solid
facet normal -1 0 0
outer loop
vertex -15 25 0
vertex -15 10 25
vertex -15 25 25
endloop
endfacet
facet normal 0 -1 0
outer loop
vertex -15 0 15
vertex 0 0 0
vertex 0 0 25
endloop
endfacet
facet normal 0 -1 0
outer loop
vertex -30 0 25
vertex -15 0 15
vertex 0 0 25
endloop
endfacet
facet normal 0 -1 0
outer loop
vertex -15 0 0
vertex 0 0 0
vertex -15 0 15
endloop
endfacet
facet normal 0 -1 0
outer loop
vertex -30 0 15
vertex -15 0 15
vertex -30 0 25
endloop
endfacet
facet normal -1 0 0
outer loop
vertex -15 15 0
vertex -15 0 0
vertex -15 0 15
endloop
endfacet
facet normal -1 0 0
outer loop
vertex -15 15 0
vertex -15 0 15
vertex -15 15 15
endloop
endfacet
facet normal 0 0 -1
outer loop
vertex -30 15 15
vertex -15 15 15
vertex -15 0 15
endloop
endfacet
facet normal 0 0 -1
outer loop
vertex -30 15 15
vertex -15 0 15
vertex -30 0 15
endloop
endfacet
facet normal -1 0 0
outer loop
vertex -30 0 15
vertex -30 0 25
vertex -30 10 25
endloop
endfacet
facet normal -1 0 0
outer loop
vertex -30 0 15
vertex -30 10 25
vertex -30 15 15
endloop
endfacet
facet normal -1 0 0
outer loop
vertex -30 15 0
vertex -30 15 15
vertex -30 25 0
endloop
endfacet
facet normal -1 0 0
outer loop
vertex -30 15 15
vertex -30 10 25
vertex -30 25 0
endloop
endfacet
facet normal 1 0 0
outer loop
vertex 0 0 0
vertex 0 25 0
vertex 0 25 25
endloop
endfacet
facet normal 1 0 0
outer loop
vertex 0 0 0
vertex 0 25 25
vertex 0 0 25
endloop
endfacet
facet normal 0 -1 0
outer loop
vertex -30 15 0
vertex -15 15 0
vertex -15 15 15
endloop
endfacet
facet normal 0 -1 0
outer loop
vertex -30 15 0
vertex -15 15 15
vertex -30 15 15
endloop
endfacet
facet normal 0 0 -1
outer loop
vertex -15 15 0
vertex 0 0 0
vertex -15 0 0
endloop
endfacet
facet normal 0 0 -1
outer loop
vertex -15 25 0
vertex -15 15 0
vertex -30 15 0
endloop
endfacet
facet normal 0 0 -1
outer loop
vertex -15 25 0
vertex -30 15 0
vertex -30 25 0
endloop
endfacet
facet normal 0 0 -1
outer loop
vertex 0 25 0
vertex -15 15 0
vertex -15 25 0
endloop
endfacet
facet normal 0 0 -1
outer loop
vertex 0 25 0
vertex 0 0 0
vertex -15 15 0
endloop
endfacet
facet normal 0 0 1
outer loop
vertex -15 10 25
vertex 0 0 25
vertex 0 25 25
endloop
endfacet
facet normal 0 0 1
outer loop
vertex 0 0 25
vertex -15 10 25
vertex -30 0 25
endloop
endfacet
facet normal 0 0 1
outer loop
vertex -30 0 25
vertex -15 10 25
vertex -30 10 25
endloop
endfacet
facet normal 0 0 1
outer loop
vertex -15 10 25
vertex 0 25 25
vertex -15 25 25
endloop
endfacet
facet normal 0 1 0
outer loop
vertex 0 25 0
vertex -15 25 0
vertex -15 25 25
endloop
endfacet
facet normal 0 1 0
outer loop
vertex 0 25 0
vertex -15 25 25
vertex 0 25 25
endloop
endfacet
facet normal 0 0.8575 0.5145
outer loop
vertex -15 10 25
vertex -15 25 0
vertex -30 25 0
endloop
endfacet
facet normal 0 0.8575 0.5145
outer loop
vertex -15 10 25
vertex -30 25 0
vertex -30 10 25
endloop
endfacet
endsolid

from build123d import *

# Parameters (mm, degrees)
BOSS_EXTRUDE1_DEPTH = 25
BOSS_EXTRUDE2_DEPTH = 15
SKETCH3_W           = 15
SKETCH3_H           = 15
CUT_EXTRUDE1_DEPTH  = 15


with BuildPart() as part:
    # Sketch1 → Boss-Extrude1 (new body)
    with BuildSketch(Plane.XY):
        Polygon((-30, 10), (-15, 10), (-15, 25), (0, 25), (0, 0), (-30, 0), align=None)
    extrude(amount=BOSS_EXTRUDE1_DEPTH)

    # Sketch2 → Boss-Extrude2 (add)
    with BuildSketch(Plane.ZY.offset(15)):
        Polygon((0, 25), (25, 10), (0, 10), align=None)
    extrude(amount=BOSS_EXTRUDE2_DEPTH)

    # Sketch3 → Cut-Extrude1 (cut)
    with BuildSketch(Plane(origin=(0, 0, 0), x_dir=(-1, 0, 0), z_dir=(0, 0, -1))):
        with Locations((22.5, 7.5)):
            Rectangle(SKETCH3_W, SKETCH3_H)
    extrude(amount=-CUT_EXTRUDE1_DEPTH, mode=Mode.SUBTRACT)


solid = part.part
